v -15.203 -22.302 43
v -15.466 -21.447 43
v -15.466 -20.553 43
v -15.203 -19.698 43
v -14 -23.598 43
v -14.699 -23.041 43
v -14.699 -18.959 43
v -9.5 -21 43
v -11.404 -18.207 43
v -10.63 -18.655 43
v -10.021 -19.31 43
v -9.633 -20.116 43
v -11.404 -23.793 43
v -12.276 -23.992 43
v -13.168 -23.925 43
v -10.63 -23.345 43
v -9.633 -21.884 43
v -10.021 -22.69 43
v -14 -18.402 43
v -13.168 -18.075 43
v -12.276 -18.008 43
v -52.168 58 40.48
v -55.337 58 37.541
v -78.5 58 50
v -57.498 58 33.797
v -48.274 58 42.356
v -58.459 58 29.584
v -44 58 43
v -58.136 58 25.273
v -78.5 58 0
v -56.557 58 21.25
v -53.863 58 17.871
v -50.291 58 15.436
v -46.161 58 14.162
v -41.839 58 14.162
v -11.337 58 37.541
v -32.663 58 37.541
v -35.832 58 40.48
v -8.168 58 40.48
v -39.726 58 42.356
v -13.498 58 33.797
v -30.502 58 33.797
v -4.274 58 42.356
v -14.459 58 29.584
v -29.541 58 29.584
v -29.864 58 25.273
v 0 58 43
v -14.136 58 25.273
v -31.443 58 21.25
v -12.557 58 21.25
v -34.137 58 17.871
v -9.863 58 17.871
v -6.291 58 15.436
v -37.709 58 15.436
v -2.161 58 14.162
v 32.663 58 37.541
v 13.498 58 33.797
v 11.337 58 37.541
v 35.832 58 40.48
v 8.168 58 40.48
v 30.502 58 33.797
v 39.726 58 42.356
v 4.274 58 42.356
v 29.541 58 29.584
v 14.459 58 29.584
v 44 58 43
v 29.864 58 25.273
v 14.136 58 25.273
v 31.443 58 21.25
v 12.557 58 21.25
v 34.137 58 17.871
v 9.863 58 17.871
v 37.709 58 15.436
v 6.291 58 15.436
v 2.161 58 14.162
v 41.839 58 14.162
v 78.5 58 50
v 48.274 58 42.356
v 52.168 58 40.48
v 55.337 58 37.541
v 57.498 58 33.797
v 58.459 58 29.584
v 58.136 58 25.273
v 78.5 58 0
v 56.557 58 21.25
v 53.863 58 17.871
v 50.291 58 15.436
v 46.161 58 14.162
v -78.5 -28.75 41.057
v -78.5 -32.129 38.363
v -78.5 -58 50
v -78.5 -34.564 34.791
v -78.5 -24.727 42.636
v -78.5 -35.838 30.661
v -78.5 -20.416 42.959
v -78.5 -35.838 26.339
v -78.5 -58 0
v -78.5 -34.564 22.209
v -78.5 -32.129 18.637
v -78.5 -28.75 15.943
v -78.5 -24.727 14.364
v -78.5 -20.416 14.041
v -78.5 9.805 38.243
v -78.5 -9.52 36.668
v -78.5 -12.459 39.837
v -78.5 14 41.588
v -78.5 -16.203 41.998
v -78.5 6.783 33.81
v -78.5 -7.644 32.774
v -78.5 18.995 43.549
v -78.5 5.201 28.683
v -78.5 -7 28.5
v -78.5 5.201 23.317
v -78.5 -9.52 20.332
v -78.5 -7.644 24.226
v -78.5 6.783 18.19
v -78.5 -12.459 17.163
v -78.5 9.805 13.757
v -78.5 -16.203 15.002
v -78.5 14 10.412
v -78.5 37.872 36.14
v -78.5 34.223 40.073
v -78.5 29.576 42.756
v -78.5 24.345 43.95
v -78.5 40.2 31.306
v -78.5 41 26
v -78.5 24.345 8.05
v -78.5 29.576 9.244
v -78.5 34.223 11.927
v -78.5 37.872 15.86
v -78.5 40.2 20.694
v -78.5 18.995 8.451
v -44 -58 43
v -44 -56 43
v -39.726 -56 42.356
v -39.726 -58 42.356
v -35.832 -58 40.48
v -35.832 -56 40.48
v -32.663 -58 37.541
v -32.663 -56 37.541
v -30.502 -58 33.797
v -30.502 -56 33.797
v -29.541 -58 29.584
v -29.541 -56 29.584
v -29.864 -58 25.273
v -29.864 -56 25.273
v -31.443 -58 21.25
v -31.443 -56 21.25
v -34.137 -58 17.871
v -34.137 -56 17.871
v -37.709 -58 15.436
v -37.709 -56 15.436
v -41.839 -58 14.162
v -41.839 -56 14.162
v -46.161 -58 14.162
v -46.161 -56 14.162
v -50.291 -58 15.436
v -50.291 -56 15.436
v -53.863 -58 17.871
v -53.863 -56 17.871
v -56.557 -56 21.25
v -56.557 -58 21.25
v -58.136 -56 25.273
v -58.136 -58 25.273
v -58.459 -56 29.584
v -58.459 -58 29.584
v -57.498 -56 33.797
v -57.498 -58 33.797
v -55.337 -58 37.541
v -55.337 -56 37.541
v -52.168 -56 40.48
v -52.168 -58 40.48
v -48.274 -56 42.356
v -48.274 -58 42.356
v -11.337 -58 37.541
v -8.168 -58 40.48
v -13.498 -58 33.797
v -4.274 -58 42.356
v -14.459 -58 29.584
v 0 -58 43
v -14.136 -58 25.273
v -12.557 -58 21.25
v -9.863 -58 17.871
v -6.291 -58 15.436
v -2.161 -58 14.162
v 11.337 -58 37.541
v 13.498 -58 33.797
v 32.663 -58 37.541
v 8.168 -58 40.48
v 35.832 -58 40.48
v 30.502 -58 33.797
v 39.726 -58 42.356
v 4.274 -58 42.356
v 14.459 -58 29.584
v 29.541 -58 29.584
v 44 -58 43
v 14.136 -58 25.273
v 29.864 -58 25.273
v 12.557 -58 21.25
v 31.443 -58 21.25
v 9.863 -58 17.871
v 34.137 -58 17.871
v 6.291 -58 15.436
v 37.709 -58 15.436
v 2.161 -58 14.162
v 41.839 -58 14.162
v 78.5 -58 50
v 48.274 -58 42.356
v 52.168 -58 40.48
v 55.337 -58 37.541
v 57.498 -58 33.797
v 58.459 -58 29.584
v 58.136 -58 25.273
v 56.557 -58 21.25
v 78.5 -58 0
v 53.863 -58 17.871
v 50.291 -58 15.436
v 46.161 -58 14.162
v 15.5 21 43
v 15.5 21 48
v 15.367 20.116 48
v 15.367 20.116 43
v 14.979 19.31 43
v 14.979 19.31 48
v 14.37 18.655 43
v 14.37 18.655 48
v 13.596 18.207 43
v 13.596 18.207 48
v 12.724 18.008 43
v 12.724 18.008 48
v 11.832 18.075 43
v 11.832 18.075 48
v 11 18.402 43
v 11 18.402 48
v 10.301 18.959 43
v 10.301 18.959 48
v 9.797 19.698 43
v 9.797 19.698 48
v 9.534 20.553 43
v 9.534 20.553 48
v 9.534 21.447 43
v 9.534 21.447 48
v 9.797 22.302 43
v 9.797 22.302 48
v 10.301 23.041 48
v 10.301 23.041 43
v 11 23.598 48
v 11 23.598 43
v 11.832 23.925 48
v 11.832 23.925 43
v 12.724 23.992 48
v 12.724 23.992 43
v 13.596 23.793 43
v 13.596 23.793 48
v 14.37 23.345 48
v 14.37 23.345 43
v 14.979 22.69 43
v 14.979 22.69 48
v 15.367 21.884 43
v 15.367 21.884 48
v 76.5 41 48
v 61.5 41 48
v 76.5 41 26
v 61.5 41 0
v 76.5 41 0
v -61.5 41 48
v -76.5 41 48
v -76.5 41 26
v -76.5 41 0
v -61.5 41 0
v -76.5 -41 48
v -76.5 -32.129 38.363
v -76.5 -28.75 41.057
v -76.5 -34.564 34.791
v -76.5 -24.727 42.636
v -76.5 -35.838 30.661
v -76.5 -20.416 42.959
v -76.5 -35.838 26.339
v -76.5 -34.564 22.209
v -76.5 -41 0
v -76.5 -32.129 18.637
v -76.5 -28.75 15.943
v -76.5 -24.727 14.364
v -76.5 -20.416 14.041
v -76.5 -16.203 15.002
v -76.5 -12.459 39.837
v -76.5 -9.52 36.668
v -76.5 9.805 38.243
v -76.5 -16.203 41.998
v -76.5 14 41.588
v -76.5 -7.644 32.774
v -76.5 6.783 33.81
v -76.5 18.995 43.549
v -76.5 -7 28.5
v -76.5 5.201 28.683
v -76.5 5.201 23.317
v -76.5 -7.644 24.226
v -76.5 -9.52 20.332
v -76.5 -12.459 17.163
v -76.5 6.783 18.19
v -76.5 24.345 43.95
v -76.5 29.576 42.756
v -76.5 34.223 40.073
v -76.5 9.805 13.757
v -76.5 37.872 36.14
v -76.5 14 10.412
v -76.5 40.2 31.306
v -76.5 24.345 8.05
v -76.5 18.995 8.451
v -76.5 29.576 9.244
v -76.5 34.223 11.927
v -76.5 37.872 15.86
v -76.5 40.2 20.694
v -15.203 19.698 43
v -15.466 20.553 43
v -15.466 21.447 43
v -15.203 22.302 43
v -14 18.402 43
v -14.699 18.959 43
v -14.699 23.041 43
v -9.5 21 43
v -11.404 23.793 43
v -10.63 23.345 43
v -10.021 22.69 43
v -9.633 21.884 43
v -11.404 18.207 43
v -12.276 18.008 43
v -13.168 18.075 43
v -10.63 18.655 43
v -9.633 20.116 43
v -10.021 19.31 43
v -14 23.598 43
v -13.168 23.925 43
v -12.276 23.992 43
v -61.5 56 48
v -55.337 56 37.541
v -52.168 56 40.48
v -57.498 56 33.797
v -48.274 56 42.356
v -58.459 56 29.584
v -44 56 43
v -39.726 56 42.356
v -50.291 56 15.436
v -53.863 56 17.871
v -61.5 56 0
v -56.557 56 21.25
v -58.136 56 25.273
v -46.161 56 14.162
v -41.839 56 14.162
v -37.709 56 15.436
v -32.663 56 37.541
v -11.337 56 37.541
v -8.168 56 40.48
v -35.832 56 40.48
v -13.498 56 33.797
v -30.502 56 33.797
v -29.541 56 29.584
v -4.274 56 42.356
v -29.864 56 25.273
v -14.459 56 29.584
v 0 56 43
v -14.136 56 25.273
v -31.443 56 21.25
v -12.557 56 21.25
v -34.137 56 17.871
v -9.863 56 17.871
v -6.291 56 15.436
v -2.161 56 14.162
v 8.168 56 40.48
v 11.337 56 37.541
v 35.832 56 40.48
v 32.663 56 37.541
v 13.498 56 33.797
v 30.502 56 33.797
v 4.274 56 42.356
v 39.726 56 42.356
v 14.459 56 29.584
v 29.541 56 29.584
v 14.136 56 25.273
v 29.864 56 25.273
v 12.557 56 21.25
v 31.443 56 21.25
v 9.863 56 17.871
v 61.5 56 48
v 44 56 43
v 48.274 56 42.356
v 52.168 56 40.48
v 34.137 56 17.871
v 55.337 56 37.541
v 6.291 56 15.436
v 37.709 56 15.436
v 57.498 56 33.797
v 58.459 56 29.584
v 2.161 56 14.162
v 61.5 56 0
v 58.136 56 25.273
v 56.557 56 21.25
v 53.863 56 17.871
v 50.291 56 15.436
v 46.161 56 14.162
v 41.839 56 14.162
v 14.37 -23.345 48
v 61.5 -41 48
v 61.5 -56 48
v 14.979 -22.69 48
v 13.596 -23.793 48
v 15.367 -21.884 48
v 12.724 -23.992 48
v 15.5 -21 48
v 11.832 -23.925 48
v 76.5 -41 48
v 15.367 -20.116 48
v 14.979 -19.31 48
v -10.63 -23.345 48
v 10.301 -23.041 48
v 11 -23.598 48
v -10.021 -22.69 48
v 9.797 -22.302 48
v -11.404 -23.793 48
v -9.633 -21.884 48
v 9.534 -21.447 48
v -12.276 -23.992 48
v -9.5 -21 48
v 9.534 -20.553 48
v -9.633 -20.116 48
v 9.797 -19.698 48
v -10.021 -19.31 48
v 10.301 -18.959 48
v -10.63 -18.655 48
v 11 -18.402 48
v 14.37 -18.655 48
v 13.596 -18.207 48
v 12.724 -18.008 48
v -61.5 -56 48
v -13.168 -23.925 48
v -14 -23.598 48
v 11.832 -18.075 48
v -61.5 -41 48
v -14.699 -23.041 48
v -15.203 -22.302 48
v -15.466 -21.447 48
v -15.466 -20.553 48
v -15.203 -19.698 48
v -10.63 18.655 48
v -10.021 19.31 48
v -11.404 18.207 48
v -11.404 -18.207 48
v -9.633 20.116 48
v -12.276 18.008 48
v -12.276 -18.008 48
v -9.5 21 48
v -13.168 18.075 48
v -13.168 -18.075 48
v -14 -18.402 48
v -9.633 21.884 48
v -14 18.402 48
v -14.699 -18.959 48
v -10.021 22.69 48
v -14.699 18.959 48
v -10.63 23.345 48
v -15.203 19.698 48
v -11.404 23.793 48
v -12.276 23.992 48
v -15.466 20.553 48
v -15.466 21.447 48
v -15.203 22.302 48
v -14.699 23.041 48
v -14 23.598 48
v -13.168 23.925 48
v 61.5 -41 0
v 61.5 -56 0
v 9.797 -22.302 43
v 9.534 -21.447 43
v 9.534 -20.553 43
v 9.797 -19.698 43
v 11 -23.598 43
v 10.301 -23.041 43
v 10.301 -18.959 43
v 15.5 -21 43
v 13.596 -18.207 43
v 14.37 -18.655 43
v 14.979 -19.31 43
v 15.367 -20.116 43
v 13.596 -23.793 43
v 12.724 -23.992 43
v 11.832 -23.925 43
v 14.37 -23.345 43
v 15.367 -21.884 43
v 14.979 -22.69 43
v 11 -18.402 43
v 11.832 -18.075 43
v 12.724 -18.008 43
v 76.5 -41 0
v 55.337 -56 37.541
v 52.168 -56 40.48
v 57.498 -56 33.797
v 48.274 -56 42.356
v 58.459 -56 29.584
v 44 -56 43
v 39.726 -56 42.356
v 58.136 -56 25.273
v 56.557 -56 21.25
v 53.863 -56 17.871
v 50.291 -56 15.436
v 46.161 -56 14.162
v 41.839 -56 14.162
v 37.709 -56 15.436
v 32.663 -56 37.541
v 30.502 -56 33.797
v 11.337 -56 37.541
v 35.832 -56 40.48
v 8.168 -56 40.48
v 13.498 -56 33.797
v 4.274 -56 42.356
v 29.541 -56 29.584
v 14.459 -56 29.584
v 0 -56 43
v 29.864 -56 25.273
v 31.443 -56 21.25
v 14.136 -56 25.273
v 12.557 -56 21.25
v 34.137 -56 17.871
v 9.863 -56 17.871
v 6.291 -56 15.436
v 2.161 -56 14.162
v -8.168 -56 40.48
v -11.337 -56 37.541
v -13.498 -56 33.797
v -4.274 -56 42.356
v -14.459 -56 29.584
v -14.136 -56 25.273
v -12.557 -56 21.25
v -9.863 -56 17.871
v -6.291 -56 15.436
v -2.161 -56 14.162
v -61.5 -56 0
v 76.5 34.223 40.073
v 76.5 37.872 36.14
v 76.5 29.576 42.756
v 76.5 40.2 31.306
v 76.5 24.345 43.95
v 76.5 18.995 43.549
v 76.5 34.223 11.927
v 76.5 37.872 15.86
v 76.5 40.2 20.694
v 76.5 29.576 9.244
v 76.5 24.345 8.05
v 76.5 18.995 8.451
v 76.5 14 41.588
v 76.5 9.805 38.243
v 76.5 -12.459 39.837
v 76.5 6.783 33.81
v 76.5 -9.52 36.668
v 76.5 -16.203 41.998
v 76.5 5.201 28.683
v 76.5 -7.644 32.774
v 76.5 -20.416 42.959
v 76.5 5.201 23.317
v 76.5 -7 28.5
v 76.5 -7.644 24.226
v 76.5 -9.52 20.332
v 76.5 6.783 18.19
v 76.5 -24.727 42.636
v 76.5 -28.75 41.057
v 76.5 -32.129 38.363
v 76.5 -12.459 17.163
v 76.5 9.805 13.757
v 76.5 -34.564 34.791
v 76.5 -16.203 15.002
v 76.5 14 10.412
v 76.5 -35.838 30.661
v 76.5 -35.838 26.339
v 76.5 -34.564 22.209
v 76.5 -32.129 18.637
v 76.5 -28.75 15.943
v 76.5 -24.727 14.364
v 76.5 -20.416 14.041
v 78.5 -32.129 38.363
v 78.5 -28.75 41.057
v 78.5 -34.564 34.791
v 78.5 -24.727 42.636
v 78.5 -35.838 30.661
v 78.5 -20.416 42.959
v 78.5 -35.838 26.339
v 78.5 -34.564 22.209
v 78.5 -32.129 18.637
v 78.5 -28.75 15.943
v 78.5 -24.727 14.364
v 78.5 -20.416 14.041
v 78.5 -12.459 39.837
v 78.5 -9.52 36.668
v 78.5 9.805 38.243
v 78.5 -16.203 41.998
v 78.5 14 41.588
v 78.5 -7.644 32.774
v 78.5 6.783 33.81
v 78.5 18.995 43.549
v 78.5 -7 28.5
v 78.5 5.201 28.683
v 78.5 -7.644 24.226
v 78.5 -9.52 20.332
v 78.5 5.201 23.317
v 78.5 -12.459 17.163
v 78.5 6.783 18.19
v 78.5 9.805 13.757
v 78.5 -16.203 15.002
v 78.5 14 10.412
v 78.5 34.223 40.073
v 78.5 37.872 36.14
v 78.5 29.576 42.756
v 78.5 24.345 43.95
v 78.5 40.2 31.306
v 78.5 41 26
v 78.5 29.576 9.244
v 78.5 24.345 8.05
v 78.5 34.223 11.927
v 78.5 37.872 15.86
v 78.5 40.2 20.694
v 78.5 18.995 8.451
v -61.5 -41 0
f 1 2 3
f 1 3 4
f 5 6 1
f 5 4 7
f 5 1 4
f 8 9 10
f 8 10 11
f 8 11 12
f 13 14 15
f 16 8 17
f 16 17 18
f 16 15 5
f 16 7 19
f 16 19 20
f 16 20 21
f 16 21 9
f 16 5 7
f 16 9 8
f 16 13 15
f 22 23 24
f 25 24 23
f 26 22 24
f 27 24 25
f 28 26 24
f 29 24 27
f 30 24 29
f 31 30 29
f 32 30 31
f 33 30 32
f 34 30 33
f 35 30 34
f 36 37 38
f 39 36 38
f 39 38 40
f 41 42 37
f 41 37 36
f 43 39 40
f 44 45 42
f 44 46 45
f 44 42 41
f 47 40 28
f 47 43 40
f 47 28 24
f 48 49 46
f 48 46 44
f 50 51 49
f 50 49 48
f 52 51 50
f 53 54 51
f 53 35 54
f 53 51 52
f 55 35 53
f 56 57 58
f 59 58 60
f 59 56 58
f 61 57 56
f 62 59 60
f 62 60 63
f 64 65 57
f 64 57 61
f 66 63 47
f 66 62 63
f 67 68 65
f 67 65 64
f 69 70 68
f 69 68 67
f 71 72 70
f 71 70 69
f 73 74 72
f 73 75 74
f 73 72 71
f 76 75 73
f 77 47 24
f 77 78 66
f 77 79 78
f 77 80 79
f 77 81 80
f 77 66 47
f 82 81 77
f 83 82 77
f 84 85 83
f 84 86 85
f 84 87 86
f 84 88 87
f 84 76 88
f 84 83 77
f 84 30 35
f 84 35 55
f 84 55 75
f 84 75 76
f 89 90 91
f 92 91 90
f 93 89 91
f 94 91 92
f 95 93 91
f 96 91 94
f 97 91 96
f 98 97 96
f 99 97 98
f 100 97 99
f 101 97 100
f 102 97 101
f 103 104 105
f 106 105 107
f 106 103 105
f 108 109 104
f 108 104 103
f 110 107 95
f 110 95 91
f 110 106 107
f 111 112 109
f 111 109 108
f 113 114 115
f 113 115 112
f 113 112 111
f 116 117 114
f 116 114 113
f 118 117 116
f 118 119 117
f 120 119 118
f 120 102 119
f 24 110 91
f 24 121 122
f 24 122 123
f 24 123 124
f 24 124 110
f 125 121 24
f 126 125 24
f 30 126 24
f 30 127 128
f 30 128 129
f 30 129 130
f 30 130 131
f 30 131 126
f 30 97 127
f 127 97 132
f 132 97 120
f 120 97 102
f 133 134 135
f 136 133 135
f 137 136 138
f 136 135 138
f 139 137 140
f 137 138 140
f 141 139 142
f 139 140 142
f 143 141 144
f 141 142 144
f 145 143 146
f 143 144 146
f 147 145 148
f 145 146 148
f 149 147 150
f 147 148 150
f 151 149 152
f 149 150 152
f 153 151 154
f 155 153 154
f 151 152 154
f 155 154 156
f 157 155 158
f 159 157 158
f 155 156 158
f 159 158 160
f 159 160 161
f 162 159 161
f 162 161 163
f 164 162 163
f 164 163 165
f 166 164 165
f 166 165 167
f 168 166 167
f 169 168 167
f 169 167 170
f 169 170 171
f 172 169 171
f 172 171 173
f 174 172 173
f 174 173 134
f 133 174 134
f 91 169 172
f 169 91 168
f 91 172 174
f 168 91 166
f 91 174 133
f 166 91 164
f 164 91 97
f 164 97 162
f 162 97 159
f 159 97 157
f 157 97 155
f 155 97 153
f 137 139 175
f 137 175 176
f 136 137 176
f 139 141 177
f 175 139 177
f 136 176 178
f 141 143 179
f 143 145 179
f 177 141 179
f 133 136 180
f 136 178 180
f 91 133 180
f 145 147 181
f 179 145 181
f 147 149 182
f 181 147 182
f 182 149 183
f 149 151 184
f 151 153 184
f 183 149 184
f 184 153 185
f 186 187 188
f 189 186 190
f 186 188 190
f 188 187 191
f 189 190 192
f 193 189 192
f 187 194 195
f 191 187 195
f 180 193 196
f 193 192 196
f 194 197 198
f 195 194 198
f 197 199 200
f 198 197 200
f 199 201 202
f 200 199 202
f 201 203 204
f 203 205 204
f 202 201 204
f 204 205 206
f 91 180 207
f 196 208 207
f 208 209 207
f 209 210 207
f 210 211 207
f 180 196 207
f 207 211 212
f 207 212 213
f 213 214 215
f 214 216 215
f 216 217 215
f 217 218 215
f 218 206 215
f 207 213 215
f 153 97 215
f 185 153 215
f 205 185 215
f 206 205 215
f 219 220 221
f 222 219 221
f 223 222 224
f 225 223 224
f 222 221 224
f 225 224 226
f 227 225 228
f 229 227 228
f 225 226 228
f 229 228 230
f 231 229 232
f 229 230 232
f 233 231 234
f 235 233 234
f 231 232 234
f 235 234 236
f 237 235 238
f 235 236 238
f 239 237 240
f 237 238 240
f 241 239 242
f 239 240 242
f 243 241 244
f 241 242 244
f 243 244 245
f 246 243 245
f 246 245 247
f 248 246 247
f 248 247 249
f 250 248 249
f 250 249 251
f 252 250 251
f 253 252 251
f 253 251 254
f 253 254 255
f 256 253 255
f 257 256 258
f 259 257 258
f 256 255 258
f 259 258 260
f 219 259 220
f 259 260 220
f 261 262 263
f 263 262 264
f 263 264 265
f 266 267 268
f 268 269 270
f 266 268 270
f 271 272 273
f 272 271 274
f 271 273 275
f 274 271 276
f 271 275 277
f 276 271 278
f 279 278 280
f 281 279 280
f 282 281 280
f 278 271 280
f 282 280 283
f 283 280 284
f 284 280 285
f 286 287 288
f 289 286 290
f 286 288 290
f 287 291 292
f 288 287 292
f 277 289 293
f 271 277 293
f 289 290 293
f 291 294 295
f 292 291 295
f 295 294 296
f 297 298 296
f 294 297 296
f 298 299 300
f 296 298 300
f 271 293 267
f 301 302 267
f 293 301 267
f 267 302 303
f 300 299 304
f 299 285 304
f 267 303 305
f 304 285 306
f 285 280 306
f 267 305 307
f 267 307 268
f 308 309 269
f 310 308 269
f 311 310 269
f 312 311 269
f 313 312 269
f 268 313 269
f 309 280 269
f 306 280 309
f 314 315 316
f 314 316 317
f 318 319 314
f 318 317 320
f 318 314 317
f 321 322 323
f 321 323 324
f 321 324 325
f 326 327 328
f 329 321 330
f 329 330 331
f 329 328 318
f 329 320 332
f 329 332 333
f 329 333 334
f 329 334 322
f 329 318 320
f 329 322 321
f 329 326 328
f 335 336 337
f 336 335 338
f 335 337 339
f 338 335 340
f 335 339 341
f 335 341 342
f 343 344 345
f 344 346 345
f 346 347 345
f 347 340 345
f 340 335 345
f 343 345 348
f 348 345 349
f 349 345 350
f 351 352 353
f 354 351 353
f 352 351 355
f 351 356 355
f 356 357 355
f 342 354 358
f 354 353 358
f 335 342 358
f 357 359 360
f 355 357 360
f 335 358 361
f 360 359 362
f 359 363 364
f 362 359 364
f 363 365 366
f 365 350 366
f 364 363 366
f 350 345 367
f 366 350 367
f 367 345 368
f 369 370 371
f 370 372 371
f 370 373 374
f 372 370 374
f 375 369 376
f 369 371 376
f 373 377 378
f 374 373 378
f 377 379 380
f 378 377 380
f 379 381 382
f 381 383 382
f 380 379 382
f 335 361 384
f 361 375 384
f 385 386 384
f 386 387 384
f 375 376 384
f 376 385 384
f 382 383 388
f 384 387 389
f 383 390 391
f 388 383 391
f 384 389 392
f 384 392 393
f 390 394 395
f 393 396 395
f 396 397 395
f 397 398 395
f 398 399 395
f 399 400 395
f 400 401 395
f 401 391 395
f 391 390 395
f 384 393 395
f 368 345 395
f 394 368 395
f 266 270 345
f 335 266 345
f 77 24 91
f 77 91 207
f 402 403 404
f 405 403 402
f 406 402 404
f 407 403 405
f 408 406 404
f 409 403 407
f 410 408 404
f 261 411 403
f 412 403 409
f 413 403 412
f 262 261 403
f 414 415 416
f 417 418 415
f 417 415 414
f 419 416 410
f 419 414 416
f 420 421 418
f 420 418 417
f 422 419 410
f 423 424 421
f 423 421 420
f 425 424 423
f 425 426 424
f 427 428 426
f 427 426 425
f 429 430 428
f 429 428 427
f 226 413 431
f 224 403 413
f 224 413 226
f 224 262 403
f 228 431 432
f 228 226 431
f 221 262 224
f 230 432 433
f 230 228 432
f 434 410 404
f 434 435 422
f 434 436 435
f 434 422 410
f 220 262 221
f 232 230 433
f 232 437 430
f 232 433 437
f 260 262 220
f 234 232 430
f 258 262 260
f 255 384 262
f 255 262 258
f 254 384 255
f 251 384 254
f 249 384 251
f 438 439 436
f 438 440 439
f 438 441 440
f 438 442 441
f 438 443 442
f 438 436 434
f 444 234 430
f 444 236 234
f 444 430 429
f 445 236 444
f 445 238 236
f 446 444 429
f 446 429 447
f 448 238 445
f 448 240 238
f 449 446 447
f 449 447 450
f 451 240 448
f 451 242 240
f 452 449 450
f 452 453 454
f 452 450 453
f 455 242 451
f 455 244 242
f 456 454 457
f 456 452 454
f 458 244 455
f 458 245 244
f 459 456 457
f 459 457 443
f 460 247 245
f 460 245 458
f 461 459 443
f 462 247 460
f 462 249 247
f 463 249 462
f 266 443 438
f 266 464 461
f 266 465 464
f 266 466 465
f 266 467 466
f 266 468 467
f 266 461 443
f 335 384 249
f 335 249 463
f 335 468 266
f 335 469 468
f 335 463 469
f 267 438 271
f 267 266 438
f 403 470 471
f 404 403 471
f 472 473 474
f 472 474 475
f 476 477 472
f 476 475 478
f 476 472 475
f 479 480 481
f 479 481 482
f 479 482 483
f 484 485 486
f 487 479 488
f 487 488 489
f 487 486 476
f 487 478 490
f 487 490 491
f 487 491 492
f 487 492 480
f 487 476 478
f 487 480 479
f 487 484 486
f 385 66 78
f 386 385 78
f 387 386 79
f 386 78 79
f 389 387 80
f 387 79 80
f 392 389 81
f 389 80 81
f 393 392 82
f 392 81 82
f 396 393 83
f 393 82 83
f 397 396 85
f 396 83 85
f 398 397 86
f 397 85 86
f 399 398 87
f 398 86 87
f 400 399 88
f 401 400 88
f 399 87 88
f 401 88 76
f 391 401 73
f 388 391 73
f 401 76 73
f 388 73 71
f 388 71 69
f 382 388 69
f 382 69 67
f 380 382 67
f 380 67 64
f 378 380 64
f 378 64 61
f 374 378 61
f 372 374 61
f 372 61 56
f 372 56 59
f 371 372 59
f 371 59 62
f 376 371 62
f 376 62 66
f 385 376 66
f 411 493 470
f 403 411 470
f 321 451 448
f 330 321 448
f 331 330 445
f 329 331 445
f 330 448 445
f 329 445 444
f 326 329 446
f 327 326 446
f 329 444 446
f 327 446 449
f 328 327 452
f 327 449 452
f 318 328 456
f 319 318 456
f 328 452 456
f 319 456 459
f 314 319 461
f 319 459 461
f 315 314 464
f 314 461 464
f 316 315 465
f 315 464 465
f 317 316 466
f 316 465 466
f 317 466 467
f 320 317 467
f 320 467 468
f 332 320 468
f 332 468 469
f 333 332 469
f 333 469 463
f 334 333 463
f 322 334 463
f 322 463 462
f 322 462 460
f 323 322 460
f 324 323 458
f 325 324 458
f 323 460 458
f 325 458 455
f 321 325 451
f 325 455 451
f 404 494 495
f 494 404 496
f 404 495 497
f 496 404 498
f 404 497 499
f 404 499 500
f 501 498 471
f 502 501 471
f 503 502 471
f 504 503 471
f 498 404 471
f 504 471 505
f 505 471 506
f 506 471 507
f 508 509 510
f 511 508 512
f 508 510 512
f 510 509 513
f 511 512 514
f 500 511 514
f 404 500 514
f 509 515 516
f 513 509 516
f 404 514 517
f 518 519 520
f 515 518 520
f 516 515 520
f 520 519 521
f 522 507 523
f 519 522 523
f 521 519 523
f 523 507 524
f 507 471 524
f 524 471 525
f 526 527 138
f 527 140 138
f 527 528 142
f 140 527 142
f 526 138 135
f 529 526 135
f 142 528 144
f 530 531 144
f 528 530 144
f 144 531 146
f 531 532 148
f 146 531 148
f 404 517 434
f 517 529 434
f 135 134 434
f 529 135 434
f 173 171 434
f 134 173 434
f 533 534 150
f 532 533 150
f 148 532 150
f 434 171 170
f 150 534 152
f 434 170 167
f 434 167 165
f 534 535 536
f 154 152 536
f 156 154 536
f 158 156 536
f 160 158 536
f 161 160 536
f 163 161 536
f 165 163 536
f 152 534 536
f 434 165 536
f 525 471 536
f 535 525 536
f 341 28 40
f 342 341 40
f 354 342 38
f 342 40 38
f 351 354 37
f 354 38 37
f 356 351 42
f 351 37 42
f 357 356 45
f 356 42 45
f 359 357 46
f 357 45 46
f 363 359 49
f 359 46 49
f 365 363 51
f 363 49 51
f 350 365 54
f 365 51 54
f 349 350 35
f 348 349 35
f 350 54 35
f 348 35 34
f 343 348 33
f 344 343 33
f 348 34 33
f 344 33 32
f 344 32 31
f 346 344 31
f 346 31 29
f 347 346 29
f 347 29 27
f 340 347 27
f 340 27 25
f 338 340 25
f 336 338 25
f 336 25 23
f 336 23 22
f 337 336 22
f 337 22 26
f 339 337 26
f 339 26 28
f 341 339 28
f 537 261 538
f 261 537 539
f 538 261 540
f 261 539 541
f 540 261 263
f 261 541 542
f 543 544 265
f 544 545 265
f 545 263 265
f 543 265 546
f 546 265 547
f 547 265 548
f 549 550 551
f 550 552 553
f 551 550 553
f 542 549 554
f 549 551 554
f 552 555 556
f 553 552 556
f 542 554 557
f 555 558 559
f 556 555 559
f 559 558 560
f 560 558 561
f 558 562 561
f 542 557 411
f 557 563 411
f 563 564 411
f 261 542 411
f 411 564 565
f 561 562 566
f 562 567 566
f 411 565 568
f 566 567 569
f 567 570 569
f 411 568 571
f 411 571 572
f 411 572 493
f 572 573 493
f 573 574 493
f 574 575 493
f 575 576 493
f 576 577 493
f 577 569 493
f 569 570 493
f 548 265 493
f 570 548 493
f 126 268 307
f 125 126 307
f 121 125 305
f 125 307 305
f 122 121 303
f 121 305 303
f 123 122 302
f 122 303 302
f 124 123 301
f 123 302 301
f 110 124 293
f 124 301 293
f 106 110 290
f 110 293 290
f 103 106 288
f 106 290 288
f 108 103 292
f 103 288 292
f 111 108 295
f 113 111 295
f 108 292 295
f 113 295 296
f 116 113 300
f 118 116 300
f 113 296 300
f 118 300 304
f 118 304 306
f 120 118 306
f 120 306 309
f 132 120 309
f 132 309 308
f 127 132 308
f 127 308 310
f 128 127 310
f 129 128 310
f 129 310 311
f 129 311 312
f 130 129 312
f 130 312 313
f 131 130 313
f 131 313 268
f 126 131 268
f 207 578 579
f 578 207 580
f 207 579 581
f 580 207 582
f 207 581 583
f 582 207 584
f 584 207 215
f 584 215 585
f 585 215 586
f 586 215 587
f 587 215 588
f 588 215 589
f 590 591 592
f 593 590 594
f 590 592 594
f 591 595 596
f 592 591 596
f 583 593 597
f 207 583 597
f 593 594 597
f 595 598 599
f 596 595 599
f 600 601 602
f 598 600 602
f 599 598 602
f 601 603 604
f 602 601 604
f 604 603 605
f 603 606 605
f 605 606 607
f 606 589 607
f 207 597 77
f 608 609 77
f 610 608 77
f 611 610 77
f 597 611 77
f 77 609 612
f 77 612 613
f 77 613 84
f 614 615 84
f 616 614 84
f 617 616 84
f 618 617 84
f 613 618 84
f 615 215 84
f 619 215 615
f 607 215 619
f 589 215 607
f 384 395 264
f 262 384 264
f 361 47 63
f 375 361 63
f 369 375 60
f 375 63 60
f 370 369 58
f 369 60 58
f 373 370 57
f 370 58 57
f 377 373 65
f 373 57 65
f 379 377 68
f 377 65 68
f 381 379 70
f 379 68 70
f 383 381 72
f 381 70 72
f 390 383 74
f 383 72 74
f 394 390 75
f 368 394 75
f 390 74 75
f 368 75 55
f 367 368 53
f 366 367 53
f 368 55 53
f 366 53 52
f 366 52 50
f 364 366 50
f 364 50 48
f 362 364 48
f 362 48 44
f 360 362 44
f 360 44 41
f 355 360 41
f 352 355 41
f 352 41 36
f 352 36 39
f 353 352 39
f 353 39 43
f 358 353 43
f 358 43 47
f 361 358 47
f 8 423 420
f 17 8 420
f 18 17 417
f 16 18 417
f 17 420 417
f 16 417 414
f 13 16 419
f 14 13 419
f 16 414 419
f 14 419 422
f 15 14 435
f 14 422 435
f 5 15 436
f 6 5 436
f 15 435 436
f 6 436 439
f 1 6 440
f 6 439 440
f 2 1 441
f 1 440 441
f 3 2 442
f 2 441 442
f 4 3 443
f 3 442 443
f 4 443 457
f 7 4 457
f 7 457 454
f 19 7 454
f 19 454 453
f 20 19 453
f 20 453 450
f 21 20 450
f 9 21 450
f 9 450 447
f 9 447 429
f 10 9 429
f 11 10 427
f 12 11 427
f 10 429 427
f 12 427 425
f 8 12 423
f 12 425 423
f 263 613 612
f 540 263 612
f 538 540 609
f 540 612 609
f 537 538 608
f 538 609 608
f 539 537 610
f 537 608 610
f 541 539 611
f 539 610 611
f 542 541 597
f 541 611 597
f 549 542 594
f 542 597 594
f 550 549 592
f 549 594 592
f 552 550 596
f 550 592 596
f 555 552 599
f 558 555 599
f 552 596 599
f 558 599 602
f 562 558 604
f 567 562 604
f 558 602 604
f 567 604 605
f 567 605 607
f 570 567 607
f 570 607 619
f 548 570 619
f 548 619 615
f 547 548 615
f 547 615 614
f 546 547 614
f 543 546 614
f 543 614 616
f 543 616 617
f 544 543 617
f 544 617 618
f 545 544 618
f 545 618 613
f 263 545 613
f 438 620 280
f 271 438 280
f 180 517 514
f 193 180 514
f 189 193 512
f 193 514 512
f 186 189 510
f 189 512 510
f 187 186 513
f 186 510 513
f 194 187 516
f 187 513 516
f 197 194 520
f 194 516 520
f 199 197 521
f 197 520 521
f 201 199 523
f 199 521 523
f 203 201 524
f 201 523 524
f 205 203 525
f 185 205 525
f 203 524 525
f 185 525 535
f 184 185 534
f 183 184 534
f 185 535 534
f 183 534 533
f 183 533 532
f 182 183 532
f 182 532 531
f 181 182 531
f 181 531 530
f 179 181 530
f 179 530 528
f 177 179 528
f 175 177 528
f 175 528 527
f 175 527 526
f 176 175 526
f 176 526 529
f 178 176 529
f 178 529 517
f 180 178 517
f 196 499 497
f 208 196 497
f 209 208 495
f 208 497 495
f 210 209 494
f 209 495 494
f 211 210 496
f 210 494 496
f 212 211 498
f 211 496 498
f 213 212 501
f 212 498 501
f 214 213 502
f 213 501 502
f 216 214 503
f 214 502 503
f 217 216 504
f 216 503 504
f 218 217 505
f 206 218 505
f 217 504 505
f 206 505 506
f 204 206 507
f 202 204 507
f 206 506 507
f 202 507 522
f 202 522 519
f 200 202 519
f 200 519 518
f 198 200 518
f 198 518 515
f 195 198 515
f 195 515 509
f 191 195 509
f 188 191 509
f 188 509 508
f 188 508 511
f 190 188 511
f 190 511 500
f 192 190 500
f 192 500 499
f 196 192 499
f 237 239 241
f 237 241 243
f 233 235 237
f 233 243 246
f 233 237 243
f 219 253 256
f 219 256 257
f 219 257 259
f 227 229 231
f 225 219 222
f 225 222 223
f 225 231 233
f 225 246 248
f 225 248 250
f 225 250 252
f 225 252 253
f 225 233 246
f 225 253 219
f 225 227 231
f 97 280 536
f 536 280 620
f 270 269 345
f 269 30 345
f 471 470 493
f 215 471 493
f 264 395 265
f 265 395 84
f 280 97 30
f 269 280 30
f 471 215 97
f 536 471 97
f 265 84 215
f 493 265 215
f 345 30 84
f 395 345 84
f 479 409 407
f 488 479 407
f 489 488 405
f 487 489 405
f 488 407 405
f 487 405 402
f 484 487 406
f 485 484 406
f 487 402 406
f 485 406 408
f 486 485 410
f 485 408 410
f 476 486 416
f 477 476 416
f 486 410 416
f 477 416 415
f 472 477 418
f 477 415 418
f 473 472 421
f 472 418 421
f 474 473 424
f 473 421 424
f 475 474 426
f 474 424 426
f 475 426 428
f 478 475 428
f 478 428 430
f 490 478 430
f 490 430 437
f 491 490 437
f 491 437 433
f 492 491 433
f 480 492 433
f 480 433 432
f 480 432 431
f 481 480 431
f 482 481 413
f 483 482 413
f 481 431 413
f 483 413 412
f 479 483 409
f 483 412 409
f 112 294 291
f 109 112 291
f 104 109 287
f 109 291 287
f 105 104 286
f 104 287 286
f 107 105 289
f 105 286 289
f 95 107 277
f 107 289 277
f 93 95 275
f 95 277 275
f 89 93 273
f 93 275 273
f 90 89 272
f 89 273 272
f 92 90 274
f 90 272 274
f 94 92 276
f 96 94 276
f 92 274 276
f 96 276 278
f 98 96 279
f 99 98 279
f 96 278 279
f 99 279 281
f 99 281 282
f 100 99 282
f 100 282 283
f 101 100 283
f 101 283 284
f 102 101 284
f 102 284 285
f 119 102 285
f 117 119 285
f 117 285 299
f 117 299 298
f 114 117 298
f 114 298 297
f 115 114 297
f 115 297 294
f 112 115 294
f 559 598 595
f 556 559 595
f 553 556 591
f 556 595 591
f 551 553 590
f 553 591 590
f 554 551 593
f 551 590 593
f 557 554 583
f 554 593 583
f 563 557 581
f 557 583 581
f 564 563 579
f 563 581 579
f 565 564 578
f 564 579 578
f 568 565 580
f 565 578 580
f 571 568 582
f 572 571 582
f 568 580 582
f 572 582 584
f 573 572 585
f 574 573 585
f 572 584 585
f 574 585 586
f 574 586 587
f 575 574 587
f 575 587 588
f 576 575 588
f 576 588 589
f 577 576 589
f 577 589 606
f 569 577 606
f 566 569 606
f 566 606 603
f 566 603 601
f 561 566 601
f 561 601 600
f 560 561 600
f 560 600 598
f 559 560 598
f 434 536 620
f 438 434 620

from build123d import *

# Parameters (mm, degrees)
ESQUISSE1_W             = 157
ESQUISSE1_H             = 116
BOSS_EXTRU_1_DEPTH      = 50
ENL_V_MAT_EXTRU_1_DEPTH = 48
ESQUISSE3_R             = 18
ESQUISSE3_R_2           = 14.5
ENL_V_MAT_EXTRU_2_DEPTH = 175.679706892
ESQUISSE4_R             = 14.5
ENL_V_MAT_EXTRU_3_DEPTH = 149.722056199
ESQUISSE5_R             = 3
BOSS_EXTRU_2_DEPTH      = 5


with BuildPart() as part:
    # Esquisse1 → Boss.-Extru.1 (new body)
    with BuildSketch(Plane.XY):
        Rectangle(ESQUISSE1_W, ESQUISSE1_H)
    extrude(amount=BOSS_EXTRU_1_DEPTH)

    # Esquisse2 → Enlèv. mat.-Extru.1 (cut)
    with BuildSketch(Plane.XY):
        Polygon((-61.5, 56), (61.5, 56), (61.5, 41), (76.5, 41), (76.5, -41), (61.5, -41), (61.5, -56), (-61.5, -56), (-61.5, -41), (-76.5, -41), (-76.5, 41), (-61.5, 41), align=None)
    extrude(amount=ENL_V_MAT_EXTRU_1_DEPTH, mode=Mode.SUBTRACT)

    # Esquisse3 → Enlèv. mat.-Extru.2 (cut, through all)
    with BuildSketch(Plane(origin=(78.5, 0, 0), x_dir=(0, 0, -1), z_dir=(1, 0, 0))):
        with Locations(Location((-26, 23, 0), (0, 0, 90))):
            Circle(ESQUISSE3_R)
        with Locations(Location((-28.5, -21.5, 0), (0, 0, 90))):
            Circle(ESQUISSE3_R_2)
    extrude(amount=-ENL_V_MAT_EXTRU_2_DEPTH, mode=Mode.SUBTRACT)

    # Esquisse4 → Enlèv. mat.-Extru.3 (cut, through all)
    with BuildSketch(Plane(origin=(0, 58, 0), x_dir=(1, 0, 0), z_dir=(0, 1, 0))):
        with Locations(Location((-44, -28.5, 0), (0, 0, 270))):
            Circle(ESQUISSE4_R)
        with Locations(Location((0, -28.5, 0), (0, 0, 270))):
            Circle(ESQUISSE4_R)
        with Locations(Location((44, -28.5, 0), (0, 0, 270))):
            Circle(ESQUISSE4_R)
    extrude(amount=-ENL_V_MAT_EXTRU_3_DEPTH, mode=Mode.SUBTRACT)

    # Esquisse5 → Boss.-Extru.2 (add)
    with BuildSketch(Plane(origin=(0, 0, 48), x_dir=(-1, 0, 0), z_dir=(0, 0, -1))):
        with Locations(Location((-12.5, -21, 0), (0, 0, 180))):
            Circle(ESQUISSE5_R)
        with Locations(Location((12.5, -21, 0), (0, 0, 180))):
            Circle(ESQUISSE5_R)
        with Locations(Location((12.5, 21, 0), (0, 0, 180))):
            Circle(ESQUISSE5_R)
        with Locations(Location((-12.5, 21, 0), (0, 0, 180))):
            Circle(ESQUISSE5_R)
    extrude(amount=BOSS_EXTRU_2_DEPTH)


solid = part.part
